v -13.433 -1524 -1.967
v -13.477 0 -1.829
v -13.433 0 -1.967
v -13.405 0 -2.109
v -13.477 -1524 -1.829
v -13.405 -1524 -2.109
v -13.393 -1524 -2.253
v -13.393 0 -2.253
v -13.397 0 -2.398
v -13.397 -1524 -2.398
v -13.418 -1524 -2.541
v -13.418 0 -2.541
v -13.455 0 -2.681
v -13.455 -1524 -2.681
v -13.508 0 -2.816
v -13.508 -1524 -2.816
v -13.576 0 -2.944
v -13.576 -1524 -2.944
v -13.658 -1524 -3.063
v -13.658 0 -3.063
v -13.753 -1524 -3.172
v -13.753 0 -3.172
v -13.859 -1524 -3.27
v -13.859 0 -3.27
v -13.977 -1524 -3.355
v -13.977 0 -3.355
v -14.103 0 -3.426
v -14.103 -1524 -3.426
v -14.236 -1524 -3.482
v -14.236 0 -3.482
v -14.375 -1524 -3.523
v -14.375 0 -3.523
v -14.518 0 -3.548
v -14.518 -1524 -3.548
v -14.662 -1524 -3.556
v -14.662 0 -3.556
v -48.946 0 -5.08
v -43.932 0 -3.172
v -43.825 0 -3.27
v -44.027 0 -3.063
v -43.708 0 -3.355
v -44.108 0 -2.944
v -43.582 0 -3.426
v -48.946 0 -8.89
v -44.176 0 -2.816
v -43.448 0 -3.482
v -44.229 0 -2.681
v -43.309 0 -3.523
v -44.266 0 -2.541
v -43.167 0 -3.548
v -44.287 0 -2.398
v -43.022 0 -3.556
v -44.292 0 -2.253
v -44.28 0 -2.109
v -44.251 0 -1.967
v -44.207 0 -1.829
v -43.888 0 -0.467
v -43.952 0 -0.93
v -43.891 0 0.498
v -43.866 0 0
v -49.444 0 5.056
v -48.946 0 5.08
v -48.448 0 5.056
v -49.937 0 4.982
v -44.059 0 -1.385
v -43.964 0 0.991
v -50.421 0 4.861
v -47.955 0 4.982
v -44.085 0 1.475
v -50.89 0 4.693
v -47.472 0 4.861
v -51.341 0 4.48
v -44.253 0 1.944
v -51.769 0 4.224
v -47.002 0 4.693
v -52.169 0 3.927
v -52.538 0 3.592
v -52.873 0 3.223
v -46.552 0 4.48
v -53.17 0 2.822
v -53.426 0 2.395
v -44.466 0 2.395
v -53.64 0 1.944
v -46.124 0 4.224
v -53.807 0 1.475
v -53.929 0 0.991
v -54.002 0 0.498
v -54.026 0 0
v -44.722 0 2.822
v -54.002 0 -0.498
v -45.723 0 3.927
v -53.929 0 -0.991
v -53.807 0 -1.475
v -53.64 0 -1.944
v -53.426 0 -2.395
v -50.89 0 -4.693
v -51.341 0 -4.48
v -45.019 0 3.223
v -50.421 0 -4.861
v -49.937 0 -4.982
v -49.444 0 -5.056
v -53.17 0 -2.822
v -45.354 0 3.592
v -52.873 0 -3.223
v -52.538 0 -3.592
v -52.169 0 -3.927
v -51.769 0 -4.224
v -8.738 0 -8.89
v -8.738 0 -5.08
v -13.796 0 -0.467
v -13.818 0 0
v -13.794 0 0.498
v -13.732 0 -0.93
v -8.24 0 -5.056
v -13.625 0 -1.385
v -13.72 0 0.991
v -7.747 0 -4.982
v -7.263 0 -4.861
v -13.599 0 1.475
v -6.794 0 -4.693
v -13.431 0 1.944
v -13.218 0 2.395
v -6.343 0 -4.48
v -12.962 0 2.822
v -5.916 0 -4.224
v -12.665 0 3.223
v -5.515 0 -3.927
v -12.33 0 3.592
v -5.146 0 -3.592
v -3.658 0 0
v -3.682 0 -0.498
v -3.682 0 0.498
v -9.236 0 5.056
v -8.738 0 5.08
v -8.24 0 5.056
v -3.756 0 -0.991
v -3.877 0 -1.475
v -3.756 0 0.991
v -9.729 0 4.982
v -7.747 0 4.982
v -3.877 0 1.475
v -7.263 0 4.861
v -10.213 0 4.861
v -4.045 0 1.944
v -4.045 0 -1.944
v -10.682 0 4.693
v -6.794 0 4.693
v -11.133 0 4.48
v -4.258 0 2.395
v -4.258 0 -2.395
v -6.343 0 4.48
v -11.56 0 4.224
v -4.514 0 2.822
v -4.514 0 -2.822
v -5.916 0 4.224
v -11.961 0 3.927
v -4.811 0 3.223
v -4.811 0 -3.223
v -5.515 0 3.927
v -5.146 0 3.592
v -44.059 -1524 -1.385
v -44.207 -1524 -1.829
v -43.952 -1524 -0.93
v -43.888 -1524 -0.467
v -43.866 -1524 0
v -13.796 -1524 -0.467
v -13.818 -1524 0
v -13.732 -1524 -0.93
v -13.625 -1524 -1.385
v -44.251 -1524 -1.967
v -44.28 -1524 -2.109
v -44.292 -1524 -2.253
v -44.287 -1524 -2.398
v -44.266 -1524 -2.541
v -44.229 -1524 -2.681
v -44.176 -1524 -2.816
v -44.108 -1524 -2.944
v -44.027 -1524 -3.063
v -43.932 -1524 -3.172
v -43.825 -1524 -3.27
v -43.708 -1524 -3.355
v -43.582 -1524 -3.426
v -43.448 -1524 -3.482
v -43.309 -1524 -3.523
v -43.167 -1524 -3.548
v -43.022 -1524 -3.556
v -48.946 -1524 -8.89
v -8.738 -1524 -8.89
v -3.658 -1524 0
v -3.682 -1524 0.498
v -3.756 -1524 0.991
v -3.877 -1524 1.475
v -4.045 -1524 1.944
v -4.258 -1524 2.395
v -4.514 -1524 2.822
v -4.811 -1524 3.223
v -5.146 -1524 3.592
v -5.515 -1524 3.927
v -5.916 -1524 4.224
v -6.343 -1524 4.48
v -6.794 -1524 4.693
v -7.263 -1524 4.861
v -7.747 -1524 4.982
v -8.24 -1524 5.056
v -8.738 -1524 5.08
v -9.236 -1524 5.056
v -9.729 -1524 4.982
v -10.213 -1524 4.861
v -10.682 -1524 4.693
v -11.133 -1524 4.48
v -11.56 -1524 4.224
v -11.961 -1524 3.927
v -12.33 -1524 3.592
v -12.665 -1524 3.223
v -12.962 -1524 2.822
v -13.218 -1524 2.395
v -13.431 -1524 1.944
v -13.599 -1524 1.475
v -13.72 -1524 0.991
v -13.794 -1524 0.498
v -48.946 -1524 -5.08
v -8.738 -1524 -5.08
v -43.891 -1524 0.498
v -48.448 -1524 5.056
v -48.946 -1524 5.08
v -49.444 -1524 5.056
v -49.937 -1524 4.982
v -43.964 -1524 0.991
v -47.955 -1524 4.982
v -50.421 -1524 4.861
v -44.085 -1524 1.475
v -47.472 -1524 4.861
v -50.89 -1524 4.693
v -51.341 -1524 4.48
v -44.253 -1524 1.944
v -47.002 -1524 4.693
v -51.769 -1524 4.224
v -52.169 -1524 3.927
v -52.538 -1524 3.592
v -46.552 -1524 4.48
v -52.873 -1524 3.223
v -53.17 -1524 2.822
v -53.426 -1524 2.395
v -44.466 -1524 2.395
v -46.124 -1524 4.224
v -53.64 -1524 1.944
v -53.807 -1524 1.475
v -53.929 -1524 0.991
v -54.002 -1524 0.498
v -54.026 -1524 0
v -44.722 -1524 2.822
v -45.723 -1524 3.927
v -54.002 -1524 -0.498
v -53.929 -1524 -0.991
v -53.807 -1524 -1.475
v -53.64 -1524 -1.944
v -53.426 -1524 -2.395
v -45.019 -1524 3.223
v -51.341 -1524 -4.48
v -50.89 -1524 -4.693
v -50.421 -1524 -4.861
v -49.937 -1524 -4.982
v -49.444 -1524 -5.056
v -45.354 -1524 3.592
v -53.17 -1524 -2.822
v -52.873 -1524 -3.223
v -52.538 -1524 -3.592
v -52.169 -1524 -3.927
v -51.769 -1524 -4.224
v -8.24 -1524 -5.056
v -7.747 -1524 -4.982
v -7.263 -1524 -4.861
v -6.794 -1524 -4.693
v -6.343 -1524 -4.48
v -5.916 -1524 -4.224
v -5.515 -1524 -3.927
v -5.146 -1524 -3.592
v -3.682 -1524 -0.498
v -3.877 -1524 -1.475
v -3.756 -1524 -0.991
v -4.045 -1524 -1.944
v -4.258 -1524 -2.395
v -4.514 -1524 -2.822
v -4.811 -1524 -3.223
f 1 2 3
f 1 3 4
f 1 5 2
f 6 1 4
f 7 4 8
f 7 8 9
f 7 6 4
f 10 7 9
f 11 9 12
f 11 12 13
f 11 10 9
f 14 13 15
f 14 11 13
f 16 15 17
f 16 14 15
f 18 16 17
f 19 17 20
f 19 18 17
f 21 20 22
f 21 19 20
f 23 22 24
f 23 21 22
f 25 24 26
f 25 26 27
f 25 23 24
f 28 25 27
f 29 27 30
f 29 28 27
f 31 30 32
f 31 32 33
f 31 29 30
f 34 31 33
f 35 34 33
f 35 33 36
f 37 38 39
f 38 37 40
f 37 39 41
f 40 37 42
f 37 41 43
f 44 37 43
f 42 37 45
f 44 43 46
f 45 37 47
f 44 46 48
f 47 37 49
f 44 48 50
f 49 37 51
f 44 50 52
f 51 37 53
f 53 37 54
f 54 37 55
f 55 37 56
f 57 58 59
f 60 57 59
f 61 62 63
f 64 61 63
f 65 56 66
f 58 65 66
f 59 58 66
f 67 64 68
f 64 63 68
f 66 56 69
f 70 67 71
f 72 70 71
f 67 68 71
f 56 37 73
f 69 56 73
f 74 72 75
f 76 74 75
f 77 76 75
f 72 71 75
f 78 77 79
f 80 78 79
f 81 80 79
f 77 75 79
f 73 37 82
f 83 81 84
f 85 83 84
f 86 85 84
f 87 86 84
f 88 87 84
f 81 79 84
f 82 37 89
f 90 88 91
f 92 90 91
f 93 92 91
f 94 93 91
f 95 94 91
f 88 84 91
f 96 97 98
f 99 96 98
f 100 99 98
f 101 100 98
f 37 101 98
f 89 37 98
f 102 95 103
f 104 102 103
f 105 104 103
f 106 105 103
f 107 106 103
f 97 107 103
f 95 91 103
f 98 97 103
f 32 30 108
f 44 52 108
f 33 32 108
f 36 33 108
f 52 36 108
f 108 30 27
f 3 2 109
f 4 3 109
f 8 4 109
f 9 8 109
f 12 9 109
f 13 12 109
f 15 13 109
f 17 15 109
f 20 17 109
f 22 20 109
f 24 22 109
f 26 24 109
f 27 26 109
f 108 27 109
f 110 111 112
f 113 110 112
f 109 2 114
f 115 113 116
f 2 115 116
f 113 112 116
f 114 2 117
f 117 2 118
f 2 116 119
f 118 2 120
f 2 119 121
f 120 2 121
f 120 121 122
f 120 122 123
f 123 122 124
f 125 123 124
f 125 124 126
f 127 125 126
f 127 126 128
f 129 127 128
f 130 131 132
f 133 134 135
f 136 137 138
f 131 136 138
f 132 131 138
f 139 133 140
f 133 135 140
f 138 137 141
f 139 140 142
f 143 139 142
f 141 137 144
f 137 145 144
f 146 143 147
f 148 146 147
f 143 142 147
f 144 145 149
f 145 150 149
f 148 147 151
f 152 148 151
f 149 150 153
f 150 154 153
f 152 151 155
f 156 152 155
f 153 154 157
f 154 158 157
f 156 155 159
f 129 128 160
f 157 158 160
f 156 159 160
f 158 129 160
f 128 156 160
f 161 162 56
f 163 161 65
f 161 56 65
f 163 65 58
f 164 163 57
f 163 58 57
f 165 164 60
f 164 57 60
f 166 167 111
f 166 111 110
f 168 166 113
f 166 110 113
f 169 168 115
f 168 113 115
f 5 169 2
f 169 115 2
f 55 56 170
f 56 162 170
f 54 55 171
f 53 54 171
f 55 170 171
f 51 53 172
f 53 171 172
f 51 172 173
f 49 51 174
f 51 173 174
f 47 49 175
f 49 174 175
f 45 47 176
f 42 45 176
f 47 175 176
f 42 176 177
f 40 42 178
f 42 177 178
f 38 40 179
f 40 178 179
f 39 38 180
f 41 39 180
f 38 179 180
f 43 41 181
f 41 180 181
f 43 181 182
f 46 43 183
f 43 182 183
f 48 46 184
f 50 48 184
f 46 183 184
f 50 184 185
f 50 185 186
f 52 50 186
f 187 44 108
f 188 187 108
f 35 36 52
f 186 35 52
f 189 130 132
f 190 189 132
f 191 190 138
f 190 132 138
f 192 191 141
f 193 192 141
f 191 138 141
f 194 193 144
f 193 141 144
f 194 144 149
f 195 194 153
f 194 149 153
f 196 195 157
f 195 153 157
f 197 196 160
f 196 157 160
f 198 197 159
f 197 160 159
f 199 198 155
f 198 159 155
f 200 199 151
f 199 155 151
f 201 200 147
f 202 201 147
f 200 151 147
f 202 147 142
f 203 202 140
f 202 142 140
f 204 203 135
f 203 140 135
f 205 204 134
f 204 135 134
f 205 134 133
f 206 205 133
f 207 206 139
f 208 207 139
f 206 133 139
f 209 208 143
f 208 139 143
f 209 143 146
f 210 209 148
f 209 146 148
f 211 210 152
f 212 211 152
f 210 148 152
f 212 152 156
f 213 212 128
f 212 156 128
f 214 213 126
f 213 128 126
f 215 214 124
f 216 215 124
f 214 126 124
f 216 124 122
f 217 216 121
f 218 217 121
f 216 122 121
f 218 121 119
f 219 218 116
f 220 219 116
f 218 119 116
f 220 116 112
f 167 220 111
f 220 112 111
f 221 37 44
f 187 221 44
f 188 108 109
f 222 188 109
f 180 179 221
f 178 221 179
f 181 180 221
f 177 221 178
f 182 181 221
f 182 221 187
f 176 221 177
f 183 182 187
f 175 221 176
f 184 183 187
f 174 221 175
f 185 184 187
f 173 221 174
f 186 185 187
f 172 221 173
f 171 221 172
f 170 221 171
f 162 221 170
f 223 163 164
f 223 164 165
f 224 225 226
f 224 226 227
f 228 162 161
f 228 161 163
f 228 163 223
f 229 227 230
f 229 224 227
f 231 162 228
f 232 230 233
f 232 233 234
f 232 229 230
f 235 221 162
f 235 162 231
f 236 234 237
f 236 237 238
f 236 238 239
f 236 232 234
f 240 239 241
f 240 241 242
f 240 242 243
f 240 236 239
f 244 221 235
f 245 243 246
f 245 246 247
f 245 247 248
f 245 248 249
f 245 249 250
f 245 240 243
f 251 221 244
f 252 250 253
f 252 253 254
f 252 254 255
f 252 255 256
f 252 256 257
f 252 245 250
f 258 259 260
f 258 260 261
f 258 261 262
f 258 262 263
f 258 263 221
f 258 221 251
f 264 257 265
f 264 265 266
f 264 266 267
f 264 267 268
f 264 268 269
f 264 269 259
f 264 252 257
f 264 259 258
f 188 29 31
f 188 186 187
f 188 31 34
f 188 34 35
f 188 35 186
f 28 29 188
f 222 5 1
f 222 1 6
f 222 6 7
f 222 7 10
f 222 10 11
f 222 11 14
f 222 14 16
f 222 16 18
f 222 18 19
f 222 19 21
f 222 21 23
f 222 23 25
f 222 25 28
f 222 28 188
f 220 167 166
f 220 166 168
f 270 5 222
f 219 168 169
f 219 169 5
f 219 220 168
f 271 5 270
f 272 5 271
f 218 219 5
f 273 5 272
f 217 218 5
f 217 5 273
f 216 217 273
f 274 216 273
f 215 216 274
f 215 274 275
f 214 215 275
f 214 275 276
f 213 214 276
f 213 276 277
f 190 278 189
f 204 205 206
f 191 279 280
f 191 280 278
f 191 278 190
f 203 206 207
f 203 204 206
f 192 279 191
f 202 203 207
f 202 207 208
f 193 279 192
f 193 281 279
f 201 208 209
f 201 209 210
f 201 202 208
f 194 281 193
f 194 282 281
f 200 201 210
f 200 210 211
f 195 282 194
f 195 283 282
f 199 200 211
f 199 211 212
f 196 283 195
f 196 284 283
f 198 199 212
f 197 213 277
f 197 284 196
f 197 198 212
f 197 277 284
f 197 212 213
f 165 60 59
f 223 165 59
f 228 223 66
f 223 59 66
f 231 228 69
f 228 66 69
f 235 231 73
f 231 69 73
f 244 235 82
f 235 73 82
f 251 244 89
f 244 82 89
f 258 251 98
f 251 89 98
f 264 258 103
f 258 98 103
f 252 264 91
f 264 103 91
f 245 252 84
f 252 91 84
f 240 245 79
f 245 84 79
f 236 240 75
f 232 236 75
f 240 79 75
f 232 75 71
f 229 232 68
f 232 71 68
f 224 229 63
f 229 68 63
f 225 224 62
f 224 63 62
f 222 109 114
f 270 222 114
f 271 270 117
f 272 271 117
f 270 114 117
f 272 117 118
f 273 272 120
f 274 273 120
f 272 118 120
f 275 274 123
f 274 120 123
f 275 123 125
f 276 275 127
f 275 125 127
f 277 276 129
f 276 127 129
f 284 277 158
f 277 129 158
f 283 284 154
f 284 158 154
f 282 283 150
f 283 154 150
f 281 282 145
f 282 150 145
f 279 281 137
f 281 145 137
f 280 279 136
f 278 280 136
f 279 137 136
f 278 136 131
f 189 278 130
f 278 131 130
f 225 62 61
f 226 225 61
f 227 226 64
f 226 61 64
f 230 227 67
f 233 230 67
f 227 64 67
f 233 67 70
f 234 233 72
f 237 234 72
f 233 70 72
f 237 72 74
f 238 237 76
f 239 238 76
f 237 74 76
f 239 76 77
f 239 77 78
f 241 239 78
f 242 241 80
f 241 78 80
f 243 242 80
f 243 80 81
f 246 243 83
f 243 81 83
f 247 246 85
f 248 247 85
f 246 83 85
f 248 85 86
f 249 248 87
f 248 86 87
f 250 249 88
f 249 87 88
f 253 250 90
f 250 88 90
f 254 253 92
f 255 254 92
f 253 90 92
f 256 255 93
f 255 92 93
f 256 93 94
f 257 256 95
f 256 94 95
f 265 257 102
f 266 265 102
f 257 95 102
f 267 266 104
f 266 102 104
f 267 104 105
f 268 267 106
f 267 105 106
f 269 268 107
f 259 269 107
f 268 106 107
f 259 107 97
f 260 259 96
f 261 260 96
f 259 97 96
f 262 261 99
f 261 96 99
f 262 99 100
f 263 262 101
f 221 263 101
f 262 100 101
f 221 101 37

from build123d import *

# Parameters (mm, degrees)
F1_DEPTH = 1524
F2_R     = 1.27


with BuildPart() as f1:
    # F0 (on Front) → F1 (new body)
    with BuildSketch(Plane.XZ):
        with BuildLine():
            ThreePointArc((-45.3183636102, -3.556), (-44.243239134, -1.9205395258), (-43.8662092519, 0))
            Line((-43.8662092519, 0), (-48.9462092519, 0))
            Line((-48.9462092519, 0), (-48.9462092519, -3.556))
            Line((-48.9462092519, -3.556), (-45.3183636102, -3.556))
        make_face()
        with BuildLine():
            Line((-48.9462092519, 0), (-43.8662092519, 0))
            ThreePointArc((-43.8662092519, 0), (-45.3541068035, 3.5921024484), (-48.9462092519, 5.08))
            Line((-48.9462092519, 5.08), (-48.9462092519, 0))
        make_face()
        with BuildLine():
            ThreePointArc((-48.9462092519, -5.08), (-46.978733712, -4.6835285843), (-45.3183636102, -3.556))
            Line((-45.3183636102, -3.556), (-48.9462092519, -3.556))
            Line((-48.9462092519, -3.556), (-48.9462092519, -5.08))
        make_face()
        with BuildLine():
            Line((-48.9462092519, 0), (-48.9462092519, 5.08))
            ThreePointArc((-48.9462092519, 5.08), (-54.0262092519, 0), (-48.9462092519, -5.08))
            Line((-48.9462092519, -5.08), (-48.9462092519, -3.556))
            Line((-48.9462092519, -3.556), (-48.9462092519, 0))
        make_face()
        with BuildLine():
            Line((-12.3658548936, -3.556), (-45.3183636102, -3.556))
            ThreePointArc((-45.3183636102, -3.556), (-46.978733712, -4.6835285843), (-48.9462092519, -5.08))
            Line((-48.9462092519, -5.08), (-48.9462092519, -8.89))
            Line((-48.9462092519, -8.89), (-8.7380092519, -8.89))
            Line((-8.7380092519, -8.89), (-8.7380092519, -5.08))
            ThreePointArc((-8.7380092519, -5.08), (-10.7054847918, -4.6835285843), (-12.3658548936, -3.556))
        make_face()
        with BuildLine():
            Line((-8.7380092519, 0), (-13.8180092519, 0))
            ThreePointArc((-13.8180092519, 0), (-13.4409793698, -1.9205395258), (-12.3658548936, -3.556))
            Line((-12.3658548936, -3.556), (-8.7380092519, -3.556))
            Line((-8.7380092519, -3.556), (-8.7380092519, 0))
        make_face()
        with BuildLine():
            ThreePointArc((-8.7380092519, 5.08), (-12.3301117003, 3.5921024484), (-13.8180092519, 0))
            Line((-13.8180092519, 0), (-8.7380092519, 0))
            Line((-8.7380092519, 0), (-8.7380092519, 5.08))
        make_face()
        with BuildLine():
            Line((-8.7380092519, -3.556), (-12.3658548936, -3.556))
            ThreePointArc((-12.3658548936, -3.556), (-10.7054847918, -4.6835285843), (-8.7380092519, -5.08))
            Line((-8.7380092519, -5.08), (-8.7380092519, -3.556))
        make_face()
        with BuildLine():
            Line((-8.7380092519, 5.08), (-8.7380092519, 0))
            Line((-8.7380092519, 0), (-8.7380092519, -3.556))
            Line((-8.7380092519, -3.556), (-8.7380092519, -5.08))
            ThreePointArc((-8.7380092519, -5.08), (-5.1459068035, -3.5921024484), (-3.6580092519, 0))
            ThreePointArc((-3.6580092519, 0), (-5.1459068035, 3.5921024484), (-8.7380092519, 5.08))
        make_face()
    extrude(amount=F1_DEPTH)

    # F2
    f2_edges = [f1.edges().sort_by_distance(p)[0] for p in [
        (-45.318364, -762, -3.556),
        (-12.365855, -762, -3.556),
    ]]
    fillet(f2_edges, radius=F2_R)


solid = f1.part
